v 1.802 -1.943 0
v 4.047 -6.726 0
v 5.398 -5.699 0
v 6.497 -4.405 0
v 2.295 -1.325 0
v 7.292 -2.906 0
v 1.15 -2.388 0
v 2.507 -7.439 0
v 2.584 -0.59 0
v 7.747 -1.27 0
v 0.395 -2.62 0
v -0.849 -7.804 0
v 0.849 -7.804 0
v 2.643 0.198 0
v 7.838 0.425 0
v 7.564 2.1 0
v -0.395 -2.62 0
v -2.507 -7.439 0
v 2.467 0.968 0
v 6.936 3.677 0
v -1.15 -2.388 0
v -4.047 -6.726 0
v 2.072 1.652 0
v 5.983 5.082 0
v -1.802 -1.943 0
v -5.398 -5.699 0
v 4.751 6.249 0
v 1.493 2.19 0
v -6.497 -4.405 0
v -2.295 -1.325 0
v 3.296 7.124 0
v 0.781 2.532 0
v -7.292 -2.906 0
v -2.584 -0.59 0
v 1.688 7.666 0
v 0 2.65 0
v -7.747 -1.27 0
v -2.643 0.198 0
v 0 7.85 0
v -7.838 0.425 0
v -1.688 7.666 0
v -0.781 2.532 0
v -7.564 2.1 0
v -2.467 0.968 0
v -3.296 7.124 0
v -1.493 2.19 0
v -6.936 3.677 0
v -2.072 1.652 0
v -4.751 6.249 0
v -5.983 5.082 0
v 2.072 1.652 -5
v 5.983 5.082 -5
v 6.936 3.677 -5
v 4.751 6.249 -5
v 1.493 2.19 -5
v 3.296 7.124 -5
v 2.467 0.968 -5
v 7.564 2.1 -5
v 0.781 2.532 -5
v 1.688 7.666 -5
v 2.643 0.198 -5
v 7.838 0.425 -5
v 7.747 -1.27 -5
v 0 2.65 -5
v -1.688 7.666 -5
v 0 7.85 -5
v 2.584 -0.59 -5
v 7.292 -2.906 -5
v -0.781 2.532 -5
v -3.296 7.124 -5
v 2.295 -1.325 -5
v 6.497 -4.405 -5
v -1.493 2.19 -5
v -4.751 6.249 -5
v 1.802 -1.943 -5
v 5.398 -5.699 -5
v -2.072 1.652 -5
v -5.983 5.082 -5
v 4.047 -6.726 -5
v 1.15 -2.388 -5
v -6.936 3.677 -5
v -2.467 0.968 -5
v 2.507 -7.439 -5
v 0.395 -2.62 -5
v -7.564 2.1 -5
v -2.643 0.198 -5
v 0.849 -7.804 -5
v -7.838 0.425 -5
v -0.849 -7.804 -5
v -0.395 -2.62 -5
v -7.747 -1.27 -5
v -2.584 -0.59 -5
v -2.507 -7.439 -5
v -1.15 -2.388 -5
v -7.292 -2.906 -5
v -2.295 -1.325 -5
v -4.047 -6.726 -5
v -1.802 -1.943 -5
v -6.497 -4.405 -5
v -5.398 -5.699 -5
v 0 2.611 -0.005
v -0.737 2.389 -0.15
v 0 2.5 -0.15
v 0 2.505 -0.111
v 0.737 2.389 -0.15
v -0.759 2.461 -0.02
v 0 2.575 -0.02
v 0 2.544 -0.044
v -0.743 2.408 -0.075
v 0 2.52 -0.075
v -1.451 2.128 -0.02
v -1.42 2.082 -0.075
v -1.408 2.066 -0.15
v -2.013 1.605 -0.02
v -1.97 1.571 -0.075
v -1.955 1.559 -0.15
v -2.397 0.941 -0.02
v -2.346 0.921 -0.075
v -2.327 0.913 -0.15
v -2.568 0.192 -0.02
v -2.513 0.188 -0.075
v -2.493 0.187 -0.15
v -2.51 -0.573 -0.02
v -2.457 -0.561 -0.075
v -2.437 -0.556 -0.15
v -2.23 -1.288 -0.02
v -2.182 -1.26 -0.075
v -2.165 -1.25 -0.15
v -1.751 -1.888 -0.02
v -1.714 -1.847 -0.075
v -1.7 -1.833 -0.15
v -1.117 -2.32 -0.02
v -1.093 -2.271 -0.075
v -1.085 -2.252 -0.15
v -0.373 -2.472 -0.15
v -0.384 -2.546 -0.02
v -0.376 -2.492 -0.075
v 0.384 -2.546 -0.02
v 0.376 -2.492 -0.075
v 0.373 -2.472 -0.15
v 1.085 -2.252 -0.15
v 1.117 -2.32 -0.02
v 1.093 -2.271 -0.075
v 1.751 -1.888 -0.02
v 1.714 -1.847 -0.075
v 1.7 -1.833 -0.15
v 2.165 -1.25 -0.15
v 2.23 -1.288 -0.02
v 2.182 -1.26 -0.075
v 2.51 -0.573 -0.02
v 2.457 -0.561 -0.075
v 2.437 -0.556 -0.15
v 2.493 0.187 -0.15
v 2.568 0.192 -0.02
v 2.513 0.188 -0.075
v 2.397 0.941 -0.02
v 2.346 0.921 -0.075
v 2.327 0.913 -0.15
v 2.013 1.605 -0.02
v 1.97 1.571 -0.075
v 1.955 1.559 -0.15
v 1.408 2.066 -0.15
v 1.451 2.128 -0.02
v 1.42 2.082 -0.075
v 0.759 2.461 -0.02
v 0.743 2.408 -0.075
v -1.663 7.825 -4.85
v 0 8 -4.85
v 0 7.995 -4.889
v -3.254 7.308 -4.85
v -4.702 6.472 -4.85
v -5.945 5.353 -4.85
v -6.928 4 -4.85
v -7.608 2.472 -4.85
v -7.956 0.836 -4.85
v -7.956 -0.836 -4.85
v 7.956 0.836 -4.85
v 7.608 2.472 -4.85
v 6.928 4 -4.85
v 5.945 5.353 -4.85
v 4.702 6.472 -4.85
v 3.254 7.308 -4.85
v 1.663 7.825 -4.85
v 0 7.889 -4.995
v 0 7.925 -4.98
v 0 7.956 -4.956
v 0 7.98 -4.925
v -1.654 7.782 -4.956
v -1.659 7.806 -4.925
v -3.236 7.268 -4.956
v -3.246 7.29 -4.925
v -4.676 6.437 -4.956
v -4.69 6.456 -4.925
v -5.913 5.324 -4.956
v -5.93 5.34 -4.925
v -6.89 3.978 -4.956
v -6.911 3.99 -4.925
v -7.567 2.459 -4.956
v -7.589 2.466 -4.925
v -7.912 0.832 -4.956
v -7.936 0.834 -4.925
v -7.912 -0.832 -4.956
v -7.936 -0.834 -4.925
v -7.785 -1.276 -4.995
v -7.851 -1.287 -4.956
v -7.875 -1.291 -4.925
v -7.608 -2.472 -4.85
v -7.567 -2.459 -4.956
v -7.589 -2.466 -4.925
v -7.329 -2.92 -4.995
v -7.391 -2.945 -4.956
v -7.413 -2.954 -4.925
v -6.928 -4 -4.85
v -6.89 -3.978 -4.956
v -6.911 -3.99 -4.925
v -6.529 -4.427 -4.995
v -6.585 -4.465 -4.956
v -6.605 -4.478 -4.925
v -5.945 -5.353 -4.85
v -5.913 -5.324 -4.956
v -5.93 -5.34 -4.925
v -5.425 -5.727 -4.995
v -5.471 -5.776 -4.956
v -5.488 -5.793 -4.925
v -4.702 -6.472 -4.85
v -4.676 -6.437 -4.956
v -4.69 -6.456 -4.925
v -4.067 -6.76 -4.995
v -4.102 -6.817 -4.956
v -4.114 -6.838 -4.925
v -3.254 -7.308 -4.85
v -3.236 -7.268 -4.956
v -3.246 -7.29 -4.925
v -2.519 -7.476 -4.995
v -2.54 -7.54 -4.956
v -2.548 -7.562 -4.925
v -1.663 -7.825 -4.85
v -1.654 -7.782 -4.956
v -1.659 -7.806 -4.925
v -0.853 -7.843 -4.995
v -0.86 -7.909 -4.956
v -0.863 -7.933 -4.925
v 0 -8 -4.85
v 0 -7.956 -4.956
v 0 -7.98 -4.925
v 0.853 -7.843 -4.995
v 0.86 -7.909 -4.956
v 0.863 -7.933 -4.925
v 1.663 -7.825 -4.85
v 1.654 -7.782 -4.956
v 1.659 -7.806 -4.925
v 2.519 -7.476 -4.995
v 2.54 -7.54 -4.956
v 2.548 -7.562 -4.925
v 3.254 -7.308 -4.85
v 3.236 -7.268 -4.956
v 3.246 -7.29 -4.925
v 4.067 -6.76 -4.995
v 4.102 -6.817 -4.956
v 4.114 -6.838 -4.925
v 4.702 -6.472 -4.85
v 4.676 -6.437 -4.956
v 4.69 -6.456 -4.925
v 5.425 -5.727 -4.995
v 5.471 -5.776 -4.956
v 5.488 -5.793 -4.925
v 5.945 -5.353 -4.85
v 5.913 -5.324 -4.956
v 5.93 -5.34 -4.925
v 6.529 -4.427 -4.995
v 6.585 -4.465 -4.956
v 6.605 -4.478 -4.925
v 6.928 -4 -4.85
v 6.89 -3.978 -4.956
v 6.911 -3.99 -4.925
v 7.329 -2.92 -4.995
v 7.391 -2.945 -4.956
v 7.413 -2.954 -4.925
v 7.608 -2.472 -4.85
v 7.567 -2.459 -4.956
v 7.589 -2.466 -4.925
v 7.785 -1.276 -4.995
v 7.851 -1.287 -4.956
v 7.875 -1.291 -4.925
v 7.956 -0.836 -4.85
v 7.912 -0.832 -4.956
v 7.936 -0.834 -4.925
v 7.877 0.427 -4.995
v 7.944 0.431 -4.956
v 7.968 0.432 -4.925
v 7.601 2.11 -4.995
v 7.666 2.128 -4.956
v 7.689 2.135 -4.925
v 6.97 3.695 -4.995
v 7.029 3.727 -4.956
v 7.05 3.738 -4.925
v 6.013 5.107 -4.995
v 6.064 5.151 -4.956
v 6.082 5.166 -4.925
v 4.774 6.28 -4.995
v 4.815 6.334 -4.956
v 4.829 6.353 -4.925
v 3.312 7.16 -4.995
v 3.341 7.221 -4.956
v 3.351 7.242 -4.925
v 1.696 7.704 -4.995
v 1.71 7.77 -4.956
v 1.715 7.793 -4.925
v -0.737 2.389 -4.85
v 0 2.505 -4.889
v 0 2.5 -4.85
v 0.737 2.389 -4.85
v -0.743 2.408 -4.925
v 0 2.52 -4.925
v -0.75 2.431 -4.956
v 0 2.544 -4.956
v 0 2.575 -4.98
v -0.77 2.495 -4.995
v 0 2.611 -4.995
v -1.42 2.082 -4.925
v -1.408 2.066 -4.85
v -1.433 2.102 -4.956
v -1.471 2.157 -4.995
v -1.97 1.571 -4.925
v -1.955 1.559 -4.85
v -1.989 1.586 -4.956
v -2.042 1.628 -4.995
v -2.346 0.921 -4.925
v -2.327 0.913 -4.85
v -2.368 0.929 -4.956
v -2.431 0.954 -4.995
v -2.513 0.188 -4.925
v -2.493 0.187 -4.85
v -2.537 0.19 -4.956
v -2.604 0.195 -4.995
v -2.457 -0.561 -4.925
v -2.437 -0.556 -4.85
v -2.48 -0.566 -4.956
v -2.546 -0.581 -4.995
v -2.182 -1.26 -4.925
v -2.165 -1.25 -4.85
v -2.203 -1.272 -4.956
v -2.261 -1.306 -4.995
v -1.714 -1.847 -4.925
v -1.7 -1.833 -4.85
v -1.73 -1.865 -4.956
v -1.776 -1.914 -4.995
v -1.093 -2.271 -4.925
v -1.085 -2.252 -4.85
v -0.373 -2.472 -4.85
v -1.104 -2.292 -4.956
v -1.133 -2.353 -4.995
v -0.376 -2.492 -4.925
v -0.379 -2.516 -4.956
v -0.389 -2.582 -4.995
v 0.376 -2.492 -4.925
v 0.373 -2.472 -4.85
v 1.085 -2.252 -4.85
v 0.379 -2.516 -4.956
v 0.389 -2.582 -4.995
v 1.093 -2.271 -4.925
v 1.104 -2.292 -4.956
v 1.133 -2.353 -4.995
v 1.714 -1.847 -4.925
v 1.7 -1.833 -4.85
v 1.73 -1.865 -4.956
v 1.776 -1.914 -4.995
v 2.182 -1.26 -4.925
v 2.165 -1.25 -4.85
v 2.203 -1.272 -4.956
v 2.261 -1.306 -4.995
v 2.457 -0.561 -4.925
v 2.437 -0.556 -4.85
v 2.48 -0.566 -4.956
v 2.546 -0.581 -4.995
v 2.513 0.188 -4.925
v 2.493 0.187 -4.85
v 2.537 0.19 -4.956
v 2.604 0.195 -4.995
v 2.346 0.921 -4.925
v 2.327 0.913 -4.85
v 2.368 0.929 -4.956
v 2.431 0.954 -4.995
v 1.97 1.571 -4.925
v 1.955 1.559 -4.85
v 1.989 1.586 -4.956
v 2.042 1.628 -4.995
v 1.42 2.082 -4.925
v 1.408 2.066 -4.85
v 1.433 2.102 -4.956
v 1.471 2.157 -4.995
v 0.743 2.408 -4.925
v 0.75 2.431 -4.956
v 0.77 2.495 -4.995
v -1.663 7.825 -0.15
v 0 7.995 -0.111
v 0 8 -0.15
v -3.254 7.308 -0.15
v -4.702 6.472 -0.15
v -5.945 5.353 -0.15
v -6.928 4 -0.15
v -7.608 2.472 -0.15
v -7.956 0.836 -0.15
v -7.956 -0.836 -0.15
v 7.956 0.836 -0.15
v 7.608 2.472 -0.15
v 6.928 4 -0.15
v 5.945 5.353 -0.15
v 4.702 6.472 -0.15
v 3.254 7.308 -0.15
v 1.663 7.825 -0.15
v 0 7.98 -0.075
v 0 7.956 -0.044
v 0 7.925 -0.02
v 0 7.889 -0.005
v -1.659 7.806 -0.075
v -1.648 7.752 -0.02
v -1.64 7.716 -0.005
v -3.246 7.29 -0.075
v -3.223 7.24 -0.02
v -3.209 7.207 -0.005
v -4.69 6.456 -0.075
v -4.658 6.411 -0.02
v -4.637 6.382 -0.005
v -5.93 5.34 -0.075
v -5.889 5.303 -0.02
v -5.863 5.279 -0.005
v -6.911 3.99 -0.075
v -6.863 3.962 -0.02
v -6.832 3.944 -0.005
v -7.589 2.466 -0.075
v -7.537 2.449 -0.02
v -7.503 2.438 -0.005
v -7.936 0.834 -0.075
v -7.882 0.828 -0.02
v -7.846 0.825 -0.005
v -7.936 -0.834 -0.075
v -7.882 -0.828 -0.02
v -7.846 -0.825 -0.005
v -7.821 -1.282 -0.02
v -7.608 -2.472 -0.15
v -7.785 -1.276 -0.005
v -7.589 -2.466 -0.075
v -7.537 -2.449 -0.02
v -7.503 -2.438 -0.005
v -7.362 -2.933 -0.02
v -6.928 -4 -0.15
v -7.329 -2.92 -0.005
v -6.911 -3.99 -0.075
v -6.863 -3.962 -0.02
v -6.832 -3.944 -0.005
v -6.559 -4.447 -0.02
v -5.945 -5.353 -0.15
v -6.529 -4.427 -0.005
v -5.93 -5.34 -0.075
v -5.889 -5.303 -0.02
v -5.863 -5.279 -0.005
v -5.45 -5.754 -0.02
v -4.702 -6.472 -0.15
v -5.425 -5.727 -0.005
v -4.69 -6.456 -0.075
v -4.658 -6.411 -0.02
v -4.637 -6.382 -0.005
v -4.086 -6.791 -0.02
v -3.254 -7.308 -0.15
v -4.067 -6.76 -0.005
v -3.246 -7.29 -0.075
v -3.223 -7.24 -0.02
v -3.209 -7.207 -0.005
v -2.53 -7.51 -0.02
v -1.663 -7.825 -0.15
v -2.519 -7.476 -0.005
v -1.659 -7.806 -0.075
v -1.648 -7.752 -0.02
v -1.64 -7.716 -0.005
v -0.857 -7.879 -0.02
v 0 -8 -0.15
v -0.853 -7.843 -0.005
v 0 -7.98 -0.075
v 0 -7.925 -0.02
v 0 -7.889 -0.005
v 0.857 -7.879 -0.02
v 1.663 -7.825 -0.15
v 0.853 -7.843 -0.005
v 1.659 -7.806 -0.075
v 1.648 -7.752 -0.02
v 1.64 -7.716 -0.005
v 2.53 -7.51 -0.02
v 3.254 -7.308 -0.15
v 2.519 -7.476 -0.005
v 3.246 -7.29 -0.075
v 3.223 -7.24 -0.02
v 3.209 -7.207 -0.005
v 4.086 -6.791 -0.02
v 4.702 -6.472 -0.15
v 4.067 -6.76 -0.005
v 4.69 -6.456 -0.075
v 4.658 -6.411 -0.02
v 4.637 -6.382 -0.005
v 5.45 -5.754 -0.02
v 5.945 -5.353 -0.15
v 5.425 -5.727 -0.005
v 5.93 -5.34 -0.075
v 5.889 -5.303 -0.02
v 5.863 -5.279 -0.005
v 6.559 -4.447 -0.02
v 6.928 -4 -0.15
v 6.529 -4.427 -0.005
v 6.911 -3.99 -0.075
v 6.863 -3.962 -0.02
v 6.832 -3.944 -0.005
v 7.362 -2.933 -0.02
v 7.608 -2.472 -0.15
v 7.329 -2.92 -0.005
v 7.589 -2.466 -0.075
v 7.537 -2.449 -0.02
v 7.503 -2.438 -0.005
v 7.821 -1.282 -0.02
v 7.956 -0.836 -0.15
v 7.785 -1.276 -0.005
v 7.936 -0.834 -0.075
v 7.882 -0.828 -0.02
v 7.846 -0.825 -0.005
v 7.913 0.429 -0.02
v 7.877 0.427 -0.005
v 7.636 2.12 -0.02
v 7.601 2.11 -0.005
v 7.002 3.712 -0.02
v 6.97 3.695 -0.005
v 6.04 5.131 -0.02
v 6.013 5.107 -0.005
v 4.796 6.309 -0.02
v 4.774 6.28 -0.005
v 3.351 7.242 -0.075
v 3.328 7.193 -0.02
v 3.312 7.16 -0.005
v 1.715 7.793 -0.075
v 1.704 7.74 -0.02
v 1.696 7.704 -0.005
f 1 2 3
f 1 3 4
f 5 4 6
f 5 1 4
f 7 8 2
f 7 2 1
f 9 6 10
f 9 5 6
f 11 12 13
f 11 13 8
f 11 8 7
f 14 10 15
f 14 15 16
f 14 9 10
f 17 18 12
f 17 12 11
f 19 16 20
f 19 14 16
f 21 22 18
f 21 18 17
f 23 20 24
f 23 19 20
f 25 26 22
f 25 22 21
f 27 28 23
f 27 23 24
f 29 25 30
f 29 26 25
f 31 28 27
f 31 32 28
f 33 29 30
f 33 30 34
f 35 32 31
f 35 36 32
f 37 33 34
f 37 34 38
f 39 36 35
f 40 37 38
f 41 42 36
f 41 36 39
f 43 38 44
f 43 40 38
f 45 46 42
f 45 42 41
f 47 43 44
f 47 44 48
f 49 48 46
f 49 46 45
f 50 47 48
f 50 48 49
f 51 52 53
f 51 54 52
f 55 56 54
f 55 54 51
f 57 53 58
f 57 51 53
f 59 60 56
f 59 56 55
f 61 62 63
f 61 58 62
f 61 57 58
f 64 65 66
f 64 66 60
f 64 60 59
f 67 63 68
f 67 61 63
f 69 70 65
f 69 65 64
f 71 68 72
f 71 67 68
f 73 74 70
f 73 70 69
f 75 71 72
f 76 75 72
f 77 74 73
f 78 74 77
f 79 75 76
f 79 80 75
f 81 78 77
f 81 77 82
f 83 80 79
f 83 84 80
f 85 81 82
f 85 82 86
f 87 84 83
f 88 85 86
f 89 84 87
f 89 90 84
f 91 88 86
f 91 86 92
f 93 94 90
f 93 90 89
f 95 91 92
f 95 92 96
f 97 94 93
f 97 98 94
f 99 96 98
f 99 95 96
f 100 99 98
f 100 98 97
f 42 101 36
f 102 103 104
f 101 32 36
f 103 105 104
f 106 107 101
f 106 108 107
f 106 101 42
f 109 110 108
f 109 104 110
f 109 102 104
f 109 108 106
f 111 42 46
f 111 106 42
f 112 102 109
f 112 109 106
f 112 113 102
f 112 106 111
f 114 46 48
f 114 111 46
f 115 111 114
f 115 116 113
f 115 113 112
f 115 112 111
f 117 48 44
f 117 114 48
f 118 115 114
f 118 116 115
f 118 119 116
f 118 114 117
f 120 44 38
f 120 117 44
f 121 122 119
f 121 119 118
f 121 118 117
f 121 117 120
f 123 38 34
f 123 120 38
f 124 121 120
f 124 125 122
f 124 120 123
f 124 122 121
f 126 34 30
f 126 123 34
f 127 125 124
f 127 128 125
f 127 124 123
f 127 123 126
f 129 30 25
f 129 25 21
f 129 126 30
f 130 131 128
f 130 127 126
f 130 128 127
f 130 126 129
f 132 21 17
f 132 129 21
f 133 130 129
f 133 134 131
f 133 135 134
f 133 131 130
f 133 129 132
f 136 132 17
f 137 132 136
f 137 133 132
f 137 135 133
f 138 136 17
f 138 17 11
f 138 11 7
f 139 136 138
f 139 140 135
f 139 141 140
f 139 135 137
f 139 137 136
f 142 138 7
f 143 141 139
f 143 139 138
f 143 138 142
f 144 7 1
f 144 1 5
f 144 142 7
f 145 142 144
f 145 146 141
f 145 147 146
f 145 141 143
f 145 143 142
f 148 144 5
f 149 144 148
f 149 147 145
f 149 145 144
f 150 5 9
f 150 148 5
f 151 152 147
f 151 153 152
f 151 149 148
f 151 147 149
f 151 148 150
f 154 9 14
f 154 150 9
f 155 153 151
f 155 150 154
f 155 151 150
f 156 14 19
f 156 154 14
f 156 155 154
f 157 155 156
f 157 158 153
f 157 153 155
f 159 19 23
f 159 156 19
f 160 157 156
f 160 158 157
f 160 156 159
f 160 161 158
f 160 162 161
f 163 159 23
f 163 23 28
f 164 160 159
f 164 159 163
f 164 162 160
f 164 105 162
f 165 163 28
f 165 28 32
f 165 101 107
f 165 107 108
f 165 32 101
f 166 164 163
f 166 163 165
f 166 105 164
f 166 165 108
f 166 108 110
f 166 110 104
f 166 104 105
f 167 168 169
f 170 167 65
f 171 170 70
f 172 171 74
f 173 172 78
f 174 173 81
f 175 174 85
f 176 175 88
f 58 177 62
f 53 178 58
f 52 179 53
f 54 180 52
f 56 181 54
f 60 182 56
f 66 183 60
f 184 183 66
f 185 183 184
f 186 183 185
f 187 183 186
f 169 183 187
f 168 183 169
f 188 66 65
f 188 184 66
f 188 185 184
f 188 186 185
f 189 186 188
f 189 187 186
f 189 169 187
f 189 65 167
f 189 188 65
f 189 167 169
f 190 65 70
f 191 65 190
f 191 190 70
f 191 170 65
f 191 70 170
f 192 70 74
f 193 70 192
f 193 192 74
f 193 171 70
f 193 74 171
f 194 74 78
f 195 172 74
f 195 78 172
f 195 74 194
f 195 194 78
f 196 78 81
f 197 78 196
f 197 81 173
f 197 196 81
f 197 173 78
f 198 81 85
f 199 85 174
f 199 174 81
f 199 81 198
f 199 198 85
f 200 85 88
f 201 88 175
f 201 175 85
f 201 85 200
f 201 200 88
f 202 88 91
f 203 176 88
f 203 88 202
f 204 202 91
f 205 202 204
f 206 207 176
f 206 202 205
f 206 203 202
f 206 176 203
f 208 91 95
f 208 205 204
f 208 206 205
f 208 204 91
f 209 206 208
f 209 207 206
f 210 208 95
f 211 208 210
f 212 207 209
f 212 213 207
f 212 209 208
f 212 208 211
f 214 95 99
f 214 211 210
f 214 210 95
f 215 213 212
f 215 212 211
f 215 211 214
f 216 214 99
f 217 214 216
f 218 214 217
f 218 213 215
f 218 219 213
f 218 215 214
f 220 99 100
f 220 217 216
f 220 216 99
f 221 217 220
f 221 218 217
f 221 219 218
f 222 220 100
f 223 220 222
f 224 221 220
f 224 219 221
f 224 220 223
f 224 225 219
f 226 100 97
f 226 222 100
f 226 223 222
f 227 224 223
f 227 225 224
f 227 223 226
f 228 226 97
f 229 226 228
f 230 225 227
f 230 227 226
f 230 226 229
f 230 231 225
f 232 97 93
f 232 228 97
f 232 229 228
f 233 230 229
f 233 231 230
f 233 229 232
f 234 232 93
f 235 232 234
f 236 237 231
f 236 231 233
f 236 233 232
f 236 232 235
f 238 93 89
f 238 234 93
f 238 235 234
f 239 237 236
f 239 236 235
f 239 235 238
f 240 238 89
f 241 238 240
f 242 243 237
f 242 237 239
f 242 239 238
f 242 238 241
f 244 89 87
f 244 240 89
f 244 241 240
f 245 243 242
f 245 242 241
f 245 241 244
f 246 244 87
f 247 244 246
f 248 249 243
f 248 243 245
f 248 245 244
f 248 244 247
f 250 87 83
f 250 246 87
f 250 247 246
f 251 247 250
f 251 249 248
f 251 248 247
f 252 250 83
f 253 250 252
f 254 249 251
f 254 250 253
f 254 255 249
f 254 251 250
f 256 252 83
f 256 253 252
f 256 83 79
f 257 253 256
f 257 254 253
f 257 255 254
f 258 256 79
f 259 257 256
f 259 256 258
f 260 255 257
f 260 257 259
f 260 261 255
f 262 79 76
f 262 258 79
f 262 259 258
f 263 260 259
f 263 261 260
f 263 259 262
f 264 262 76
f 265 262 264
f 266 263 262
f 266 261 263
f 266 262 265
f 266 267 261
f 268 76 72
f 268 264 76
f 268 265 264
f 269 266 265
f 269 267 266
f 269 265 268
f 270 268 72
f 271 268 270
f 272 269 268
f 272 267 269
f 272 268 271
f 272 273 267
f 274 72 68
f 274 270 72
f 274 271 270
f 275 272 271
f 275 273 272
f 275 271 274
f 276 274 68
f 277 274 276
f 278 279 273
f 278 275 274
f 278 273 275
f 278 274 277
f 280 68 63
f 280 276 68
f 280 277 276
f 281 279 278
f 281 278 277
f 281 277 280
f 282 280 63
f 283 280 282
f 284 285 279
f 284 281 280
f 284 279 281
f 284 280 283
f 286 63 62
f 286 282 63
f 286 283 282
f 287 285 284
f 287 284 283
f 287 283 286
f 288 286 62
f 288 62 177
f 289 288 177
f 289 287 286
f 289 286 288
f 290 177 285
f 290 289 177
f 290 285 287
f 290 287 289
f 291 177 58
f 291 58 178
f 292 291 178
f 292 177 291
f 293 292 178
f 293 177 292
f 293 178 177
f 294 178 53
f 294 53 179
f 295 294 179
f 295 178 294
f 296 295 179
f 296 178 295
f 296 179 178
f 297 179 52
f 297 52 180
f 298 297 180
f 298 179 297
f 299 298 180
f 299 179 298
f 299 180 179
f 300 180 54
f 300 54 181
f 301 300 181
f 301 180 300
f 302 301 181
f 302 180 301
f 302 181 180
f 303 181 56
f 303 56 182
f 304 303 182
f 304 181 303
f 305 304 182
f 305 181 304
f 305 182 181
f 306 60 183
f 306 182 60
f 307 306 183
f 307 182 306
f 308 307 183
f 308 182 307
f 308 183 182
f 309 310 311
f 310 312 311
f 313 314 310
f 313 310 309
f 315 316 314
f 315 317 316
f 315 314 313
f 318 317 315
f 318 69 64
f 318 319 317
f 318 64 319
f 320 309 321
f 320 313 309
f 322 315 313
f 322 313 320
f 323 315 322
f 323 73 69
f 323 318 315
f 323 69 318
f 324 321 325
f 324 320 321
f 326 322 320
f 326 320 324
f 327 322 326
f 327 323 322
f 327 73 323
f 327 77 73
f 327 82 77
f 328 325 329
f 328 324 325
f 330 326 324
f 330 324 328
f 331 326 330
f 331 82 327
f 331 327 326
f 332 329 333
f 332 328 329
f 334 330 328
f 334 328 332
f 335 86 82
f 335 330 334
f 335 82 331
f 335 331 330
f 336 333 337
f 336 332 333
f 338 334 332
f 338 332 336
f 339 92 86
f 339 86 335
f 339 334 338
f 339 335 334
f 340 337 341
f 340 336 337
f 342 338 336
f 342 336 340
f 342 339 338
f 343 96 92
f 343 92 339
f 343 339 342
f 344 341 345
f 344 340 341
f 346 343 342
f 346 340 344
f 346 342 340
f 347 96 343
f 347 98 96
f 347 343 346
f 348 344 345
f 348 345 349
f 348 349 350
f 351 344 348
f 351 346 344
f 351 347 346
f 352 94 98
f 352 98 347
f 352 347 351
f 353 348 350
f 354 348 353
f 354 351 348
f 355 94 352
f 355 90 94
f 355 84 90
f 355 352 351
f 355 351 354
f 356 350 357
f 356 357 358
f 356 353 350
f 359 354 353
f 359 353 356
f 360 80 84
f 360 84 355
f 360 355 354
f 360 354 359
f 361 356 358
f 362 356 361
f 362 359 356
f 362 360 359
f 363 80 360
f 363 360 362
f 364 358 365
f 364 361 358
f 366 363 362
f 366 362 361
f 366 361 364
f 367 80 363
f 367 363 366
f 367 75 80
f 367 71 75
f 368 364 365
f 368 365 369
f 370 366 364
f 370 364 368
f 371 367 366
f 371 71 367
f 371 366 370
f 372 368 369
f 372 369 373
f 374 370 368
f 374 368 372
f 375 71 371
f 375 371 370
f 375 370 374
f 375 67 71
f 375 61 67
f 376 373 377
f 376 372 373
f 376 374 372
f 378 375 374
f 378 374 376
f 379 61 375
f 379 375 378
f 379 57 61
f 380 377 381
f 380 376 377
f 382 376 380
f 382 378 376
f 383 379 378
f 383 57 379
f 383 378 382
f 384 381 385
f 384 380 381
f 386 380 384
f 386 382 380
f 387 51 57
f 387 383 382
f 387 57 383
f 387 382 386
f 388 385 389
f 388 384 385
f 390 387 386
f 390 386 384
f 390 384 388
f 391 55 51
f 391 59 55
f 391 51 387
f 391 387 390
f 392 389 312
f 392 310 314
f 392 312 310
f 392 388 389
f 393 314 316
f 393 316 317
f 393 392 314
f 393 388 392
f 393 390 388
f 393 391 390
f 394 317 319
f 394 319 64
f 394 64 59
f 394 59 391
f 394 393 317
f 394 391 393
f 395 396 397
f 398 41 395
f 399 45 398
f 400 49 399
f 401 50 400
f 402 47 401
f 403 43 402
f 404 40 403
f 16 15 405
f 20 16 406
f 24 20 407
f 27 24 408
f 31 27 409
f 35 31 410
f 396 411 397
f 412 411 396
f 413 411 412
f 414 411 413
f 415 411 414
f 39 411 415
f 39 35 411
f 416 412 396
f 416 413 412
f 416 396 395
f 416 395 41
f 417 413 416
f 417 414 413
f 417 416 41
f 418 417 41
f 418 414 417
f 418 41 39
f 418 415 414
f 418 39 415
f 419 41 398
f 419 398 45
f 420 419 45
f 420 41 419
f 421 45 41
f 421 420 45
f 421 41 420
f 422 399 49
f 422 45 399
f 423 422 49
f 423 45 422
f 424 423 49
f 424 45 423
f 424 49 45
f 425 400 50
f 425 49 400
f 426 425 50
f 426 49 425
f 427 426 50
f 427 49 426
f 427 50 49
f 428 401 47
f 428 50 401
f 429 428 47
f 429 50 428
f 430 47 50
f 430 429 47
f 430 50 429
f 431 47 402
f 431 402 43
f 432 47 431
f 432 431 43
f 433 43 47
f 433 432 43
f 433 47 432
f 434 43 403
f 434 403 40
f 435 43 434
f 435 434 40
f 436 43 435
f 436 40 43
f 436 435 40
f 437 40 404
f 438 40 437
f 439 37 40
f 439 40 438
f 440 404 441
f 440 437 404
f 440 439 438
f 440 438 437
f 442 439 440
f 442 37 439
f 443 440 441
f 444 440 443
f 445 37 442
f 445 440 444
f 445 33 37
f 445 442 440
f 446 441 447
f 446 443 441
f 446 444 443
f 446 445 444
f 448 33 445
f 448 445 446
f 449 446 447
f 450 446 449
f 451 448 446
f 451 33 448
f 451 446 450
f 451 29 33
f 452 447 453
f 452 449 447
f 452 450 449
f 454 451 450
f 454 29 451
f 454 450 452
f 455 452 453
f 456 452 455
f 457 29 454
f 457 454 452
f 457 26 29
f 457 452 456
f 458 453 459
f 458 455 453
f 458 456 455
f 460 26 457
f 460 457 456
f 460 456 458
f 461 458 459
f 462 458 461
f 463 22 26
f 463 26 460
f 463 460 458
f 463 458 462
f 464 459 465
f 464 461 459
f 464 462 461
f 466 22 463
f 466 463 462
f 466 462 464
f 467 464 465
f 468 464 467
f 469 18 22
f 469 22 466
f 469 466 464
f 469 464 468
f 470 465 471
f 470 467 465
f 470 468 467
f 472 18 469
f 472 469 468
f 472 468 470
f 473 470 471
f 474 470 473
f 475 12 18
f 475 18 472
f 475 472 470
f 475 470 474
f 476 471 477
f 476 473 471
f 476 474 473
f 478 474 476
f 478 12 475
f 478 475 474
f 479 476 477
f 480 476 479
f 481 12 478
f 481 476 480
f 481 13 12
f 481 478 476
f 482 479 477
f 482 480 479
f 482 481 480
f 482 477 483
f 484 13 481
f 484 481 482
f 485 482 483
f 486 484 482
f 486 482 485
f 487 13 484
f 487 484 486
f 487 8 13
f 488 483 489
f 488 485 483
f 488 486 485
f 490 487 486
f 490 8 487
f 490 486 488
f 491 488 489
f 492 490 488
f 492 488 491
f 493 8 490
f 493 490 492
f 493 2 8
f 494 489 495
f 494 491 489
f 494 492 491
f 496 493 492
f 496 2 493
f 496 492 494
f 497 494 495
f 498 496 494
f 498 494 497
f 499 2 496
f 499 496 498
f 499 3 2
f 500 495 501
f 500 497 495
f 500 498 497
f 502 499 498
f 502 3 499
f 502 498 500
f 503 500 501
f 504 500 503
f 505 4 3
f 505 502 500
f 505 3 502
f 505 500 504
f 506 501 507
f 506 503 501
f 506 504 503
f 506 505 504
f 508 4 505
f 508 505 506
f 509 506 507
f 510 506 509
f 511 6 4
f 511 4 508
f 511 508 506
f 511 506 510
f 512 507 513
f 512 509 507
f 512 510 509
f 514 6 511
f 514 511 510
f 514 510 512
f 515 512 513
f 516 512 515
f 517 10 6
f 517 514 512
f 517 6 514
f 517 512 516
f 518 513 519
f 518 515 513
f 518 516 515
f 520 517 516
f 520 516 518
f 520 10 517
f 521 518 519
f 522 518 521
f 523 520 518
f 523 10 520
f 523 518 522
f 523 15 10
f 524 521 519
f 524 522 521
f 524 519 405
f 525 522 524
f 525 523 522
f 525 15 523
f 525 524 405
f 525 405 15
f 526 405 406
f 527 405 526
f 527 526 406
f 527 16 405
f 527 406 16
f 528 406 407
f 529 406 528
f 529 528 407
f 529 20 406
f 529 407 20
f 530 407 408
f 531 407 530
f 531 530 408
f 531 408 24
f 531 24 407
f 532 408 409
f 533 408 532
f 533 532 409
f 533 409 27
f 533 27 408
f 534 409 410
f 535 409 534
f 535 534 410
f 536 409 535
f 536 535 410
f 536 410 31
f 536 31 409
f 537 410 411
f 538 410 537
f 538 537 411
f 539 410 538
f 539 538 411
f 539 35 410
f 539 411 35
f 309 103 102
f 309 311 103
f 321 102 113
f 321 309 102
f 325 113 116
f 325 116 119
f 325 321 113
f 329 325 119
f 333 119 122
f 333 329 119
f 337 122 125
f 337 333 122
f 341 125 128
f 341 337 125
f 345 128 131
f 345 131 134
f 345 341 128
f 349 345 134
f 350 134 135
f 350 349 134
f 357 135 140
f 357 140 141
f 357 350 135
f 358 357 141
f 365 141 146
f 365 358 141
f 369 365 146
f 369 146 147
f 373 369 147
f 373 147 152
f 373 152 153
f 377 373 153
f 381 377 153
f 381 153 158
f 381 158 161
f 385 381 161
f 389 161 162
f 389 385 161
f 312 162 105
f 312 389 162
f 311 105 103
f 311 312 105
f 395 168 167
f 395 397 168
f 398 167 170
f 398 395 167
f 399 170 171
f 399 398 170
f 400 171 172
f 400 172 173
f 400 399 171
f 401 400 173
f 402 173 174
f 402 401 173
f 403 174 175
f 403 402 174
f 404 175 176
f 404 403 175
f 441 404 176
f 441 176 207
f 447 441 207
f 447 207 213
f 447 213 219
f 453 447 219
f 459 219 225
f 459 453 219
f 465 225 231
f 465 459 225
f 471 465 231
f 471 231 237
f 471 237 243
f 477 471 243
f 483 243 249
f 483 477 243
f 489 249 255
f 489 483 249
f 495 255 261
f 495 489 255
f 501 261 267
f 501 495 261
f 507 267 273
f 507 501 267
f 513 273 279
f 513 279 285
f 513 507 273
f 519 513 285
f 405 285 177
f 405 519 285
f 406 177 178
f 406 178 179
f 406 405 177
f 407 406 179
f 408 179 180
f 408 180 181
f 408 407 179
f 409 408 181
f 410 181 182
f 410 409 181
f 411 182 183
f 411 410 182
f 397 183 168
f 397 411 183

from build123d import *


with BuildPart() as part:
    # Sketch1 → Revolve1 (revolve)
    with BuildSketch(Plane(origin=(0, 0, 0), x_dir=(0, 0, -1), z_dir=(1, 0, 0))):
        with BuildLine():
            Line((5, 2.65), (5, 7.85))
            ThreePointArc((5, 7.85), (4.956066017, 7.956066017), (4.85, 8))
            Line((4.85, 8), (0.15, 8))
            ThreePointArc((0.15, 8), (0.043933983, 7.956066017), (0, 7.85))
            Line((0, 7.85), (0, 2.65))
            ThreePointArc((0, 2.65), (0.043933983, 2.543933983), (0.15, 2.5))
            Line((0.15, 2.5), (4.85, 2.5))
            ThreePointArc((4.85, 2.5), (4.956066017, 2.543933983), (5, 2.65))
        make_face()
    revolve(axis=Axis((0, 0, 0), (0, 0, 1)))


solid = part.part
